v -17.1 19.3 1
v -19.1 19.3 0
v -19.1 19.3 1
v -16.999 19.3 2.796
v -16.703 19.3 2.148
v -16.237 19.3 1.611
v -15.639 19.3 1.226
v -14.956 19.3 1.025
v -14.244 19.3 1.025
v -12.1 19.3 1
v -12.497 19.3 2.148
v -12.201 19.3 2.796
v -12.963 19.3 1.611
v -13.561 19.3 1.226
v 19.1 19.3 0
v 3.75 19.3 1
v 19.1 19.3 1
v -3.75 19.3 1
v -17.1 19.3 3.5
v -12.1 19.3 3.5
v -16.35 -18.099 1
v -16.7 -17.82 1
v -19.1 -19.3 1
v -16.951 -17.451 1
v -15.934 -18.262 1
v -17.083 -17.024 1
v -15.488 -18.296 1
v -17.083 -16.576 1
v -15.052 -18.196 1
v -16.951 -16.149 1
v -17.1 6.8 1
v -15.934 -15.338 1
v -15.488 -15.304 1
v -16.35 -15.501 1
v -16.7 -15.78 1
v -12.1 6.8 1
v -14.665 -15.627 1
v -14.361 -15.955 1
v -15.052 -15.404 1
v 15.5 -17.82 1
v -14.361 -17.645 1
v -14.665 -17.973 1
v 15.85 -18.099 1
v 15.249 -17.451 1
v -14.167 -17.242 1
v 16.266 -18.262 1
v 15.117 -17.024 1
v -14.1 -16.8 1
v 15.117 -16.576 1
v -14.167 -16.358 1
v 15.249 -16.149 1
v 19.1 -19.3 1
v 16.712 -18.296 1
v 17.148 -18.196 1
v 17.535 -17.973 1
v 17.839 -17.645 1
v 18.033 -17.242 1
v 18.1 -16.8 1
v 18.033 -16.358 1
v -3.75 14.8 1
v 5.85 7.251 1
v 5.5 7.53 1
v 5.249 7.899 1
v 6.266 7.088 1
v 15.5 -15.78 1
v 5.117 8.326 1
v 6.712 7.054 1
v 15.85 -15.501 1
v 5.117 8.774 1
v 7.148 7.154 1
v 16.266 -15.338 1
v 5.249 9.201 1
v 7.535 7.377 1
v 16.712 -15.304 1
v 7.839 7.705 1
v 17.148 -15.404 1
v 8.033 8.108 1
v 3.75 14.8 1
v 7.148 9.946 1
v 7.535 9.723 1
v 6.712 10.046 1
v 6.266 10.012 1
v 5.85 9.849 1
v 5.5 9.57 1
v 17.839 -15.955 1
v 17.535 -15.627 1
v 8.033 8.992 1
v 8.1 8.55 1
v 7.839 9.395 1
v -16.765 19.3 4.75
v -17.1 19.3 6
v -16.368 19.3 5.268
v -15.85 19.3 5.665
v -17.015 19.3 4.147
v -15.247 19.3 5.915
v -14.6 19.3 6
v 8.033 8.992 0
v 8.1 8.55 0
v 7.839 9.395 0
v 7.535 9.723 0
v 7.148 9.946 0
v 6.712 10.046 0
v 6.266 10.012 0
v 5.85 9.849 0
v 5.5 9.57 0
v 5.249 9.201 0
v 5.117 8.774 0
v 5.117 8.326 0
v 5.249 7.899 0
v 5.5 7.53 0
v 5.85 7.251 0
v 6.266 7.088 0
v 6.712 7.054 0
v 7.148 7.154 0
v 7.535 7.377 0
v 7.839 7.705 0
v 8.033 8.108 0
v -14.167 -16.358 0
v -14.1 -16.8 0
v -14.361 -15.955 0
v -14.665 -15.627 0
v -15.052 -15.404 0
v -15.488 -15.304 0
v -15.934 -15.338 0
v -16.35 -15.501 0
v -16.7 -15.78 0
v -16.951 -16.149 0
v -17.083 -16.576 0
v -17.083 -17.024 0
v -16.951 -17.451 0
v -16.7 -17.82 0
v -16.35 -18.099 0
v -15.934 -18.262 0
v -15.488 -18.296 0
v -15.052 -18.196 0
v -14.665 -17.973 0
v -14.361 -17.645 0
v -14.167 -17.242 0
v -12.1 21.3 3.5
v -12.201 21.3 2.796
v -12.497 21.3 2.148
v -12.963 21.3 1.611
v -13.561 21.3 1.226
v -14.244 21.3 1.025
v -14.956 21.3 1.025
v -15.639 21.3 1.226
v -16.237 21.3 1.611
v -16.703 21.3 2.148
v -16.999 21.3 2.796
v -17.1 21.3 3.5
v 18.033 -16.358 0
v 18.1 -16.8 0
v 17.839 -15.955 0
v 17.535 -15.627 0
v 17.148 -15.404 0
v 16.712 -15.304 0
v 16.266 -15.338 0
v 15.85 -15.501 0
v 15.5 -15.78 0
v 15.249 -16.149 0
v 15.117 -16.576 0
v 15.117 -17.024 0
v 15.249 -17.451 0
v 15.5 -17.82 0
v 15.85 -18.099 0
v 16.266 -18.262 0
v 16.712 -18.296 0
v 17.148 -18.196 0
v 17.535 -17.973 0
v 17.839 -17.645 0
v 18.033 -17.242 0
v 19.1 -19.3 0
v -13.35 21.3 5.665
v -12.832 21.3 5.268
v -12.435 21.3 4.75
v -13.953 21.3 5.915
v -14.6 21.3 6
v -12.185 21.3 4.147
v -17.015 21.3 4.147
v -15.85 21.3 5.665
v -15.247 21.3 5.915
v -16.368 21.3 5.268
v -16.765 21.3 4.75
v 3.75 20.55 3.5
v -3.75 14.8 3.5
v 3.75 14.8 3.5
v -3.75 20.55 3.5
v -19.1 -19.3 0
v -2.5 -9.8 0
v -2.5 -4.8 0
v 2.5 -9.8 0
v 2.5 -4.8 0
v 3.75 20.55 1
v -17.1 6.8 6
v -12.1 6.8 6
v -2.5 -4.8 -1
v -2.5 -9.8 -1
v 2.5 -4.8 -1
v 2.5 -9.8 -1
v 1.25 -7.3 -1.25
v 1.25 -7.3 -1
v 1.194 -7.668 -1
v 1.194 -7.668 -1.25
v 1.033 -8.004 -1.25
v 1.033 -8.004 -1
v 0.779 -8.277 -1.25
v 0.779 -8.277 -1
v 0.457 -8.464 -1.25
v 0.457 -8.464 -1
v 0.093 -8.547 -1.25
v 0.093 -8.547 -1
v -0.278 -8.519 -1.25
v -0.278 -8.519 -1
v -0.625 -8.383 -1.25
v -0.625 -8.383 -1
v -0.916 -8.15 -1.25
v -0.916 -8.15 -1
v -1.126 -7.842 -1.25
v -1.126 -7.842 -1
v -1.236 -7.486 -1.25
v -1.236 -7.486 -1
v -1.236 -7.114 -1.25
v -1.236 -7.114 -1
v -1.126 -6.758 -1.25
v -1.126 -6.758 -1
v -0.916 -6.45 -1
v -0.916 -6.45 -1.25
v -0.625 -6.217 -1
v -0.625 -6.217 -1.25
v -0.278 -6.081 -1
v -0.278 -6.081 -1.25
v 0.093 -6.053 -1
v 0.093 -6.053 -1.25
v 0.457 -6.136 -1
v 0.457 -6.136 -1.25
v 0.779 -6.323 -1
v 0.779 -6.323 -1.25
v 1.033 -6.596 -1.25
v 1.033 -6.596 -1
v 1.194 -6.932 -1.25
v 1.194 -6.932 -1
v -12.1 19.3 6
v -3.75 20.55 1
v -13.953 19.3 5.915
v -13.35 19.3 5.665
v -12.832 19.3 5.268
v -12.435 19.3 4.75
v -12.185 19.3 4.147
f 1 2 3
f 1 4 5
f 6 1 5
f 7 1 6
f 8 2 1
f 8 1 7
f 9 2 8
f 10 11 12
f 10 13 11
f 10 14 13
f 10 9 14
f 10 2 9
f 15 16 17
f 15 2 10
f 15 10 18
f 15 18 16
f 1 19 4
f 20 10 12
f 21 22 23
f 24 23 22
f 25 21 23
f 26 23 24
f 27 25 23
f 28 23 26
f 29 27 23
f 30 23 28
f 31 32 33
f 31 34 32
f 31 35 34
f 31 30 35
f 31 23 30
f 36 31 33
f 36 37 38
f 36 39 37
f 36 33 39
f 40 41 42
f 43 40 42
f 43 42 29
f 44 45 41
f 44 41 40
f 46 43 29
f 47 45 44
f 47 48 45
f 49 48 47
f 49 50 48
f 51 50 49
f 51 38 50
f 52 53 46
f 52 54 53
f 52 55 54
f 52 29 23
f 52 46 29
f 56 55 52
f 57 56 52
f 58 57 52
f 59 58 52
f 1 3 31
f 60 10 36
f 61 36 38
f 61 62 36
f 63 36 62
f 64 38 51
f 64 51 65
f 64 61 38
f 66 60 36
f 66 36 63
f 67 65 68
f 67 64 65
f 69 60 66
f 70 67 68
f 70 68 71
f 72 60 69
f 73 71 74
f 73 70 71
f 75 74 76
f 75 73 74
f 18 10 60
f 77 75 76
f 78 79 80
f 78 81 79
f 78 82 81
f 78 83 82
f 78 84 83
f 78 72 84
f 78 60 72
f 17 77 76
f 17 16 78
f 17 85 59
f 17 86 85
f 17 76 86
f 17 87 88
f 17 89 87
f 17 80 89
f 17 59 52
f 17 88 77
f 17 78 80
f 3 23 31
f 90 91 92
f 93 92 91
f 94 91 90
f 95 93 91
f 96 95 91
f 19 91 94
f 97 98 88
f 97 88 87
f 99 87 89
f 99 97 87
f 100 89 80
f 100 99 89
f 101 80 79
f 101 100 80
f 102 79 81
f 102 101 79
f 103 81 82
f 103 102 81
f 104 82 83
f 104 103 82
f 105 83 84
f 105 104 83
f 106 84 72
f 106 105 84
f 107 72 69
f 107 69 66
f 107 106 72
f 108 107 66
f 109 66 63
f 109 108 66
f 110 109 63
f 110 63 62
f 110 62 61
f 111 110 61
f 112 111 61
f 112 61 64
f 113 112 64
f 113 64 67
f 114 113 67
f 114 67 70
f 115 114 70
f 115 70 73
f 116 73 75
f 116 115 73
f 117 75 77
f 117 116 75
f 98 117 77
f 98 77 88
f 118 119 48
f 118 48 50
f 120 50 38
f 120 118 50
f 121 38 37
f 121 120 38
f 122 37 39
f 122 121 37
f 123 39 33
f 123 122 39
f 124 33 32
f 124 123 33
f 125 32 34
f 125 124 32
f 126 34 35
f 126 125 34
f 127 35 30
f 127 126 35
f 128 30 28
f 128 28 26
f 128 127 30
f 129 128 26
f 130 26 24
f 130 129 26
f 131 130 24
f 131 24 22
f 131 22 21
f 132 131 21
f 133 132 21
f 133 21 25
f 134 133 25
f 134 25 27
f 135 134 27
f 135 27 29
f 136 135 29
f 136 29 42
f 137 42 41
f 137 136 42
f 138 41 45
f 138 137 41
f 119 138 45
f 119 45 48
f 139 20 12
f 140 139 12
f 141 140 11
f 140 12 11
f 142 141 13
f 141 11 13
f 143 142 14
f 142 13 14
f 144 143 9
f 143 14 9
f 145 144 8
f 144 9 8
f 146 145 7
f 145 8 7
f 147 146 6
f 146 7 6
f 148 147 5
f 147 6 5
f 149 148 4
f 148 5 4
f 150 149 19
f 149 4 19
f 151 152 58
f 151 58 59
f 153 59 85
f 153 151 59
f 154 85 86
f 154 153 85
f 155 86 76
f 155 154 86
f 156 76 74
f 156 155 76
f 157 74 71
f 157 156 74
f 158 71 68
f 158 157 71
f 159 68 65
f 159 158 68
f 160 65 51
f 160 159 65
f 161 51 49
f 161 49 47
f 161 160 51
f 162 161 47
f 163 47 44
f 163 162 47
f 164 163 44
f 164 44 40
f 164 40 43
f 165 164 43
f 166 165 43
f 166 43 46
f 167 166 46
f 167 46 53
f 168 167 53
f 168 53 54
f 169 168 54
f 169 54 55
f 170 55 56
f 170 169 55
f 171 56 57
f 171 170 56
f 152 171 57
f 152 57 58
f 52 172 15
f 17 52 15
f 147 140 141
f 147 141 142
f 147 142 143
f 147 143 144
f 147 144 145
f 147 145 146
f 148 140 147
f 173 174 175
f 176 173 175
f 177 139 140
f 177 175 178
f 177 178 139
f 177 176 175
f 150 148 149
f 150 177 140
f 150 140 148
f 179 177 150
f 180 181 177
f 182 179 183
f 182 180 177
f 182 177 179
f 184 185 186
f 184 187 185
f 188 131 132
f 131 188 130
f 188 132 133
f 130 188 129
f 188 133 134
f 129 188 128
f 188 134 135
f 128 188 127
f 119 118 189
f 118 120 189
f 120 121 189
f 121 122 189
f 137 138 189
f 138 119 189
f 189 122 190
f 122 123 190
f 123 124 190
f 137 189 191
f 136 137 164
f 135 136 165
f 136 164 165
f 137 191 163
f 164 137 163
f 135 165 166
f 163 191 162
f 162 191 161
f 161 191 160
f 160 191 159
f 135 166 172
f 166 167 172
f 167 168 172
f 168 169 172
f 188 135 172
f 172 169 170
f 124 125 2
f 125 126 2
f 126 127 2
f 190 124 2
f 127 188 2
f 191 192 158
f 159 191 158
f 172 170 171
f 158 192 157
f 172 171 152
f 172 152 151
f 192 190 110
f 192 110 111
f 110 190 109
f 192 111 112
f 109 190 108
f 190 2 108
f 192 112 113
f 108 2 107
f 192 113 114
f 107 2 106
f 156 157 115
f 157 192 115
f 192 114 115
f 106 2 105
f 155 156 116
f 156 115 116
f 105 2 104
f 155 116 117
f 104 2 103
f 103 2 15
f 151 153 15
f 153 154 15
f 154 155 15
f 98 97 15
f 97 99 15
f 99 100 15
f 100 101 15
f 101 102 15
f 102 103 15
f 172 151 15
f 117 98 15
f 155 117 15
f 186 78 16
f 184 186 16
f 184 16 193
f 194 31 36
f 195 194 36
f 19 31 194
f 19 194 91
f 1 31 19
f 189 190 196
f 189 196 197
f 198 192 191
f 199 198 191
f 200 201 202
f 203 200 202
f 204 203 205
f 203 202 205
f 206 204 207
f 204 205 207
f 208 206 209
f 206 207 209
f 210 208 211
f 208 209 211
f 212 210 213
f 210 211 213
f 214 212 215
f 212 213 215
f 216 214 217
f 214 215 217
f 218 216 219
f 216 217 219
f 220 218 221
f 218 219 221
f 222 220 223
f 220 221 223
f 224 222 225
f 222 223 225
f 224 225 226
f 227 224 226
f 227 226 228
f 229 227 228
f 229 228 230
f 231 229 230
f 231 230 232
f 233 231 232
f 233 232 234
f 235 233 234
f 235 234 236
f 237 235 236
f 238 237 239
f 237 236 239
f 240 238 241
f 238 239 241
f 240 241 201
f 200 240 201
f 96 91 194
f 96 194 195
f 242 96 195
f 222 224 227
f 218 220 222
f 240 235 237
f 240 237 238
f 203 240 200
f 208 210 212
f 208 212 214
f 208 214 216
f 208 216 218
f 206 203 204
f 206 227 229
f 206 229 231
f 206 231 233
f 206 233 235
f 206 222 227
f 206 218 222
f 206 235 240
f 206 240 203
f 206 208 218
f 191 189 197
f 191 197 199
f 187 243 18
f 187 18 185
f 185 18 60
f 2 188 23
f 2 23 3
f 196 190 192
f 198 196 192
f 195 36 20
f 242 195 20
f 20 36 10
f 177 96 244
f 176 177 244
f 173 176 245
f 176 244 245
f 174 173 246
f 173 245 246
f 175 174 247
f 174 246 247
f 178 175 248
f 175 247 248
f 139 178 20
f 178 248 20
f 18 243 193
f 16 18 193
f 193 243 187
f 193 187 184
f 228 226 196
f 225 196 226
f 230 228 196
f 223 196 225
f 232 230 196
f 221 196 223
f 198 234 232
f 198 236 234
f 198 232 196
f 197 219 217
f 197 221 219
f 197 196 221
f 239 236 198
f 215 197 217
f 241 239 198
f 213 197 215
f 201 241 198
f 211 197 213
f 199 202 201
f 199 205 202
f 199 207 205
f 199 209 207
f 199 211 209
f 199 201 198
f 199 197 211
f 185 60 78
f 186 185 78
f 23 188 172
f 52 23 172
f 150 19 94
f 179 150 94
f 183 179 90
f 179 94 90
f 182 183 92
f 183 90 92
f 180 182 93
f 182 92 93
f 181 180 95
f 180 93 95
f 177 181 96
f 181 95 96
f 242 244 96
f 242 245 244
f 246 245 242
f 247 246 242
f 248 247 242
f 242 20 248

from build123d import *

# Parameters (mm, degrees)
F0_W      = 38.2
F0_H      = 38.6
F0_R      = 1.5
F1_DEPTH  = 1
F2_W      = 7.5
F2_H      = 4.5
F2_H_2    = 1.25
F3_DEPTH  = 2.5
F4_W      = 5
F4_H      = 5
F5_DEPTH  = 1
F6_R      = 1.25
F7_DEPTH  = 0.25
F8_W      = 5
F8_H      = 12.5
F9_DEPTH  = 5
F11_DEPTH = 2


with BuildPart() as f1:
    # F0 (on Top) → F1 (new body)
    with BuildSketch(Plane.XY):
        Rectangle(F0_W, F0_H)
        with Locations((-15.6, -16.8)):
            Circle(F0_R, mode=Mode.SUBTRACT)
        with Locations((16.6, -16.8)):
            Circle(F0_R, mode=Mode.SUBTRACT)
        with Locations((6.6, 8.55)):
            Circle(F0_R, mode=Mode.SUBTRACT)
    extrude(amount=F1_DEPTH)

    # F2 (on face) → F3 (join)
    with BuildSketch(Plane.XY.offset(1)):
        with Locations((0, 17.05)):
            Rectangle(F2_W, F2_H)
        with Locations((0, 19.925)):
            Rectangle(F2_W, F2_H_2)
    extrude(amount=F3_DEPTH)

    # F4 (on face) → F5 (join)
    with BuildSketch(Plane(origin=(0, 0, 0), x_dir=(1, 0, 0), z_dir=(0, 0, -1))):
        with Locations((0, 7.3)):
            Rectangle(F4_W, F4_H)
    extrude(amount=F5_DEPTH)

    # F6 (on face) → F7 (join)
    with BuildSketch(Plane(origin=(0, 0, -1), x_dir=(1, 0, 0), z_dir=(0, 0, -1))):
        with Locations((0, 7.3)):
            Circle(F6_R)
    extrude(amount=F7_DEPTH)

    # F8 (on face) → F9 (join)
    with BuildSketch(Plane.XY.offset(1)):
        with Locations((-14.6, 13.05)):
            Rectangle(F8_W, F8_H)
    extrude(amount=F9_DEPTH)

    # F10 (on face) → F11 (join)
    with BuildSketch(Plane(origin=(0, 19.3, 0), x_dir=(-1, 0, 0), z_dir=(0, 1, 0))):
        with BuildLine():
            ThreePointArc((12.1, 3.5), (14.6, 1), (17.1, 3.5))
            ThreePointArc((17.1, 3.5), (16.367767, 5.267767), (14.6, 6))
            ThreePointArc((14.6, 6), (12.832233, 5.267767), (12.1, 3.5))
        make_face()
    extrude(amount=F11_DEPTH)


solid = f1.part
